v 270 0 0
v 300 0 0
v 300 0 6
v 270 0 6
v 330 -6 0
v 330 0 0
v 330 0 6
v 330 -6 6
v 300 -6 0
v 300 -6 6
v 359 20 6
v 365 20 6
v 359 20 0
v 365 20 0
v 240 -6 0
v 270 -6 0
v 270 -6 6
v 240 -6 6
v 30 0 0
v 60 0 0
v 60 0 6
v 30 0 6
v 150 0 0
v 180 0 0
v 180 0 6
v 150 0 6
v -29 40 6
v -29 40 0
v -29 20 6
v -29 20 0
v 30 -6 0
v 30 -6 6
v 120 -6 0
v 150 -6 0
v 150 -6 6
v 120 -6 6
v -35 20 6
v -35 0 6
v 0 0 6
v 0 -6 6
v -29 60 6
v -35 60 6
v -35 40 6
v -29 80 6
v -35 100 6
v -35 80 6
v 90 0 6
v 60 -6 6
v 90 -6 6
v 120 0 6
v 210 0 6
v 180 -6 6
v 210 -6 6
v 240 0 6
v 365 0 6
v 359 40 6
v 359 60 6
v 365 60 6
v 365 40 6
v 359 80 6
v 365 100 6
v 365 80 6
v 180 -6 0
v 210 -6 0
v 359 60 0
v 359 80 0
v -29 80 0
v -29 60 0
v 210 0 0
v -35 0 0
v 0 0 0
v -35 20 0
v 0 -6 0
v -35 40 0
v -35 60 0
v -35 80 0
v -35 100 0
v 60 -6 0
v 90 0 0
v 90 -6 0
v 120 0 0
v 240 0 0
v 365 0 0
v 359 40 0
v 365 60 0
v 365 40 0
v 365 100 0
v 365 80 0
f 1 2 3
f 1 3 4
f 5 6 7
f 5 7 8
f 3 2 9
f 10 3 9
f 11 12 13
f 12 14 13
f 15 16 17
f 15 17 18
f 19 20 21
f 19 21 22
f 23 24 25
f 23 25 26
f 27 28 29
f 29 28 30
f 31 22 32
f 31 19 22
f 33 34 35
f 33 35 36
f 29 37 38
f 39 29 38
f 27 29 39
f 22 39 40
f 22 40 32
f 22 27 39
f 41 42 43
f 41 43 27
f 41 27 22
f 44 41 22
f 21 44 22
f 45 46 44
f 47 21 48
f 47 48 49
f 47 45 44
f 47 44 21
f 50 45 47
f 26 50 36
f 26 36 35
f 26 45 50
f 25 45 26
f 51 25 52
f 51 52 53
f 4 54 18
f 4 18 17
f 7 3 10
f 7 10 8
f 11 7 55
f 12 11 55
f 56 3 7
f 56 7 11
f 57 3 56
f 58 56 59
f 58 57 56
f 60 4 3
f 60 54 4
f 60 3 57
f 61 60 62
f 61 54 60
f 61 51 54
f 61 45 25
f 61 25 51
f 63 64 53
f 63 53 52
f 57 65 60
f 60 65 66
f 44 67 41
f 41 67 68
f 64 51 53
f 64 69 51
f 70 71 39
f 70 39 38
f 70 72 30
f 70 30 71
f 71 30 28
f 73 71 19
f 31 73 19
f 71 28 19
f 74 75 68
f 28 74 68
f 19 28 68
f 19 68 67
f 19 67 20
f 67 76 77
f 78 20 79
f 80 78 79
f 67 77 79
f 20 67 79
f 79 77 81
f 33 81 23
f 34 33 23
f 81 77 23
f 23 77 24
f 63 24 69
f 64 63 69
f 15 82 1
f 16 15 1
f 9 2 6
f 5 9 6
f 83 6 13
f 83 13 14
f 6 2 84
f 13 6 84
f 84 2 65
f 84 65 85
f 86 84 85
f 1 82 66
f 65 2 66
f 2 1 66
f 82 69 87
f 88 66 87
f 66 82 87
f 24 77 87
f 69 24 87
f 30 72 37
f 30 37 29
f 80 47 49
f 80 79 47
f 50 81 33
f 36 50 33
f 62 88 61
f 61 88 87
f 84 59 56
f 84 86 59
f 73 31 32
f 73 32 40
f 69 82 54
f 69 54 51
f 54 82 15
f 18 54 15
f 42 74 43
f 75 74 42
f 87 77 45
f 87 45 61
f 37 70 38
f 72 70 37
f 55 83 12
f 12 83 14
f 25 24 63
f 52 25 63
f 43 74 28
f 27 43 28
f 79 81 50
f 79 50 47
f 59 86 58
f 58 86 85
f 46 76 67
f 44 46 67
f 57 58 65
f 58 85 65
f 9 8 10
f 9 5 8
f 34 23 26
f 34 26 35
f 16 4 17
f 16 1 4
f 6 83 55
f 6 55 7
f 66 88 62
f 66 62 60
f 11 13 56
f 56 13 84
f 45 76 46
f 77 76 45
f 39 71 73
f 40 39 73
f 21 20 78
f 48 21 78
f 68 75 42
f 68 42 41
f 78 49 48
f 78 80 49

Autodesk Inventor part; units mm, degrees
ref_plane "YZ Plane" through (0, 0, 0) normal (1, 0, 0) x (0, 1, 0)
ref_plane "XZ Plane" through (0, 0, 0) normal (0, 1, 0) x (-1, 0, 0)
ref_plane "XY Plane" through (0, 0, 0) normal (0, 0, 1) x (1, 0, 0)
ref_plane "Work Plane1" through (0, 0, 0) normal (0, 0, 1) x (1, 0, 0)
sketch "Sketch1" plane through (0, 0, 0) normal (0, 0, 1) x (1, 0, 0)
  line L0 (0, 0) -> (30, 0)
  line L1 (0, 0) -> (0, -6)
  line L2 (30, -6) -> (0, -6)
  line L3 (30, 0) -> (30, -6)
  line L4 (60, 0) -> (90, 0)
  line L5 (60, 0) -> (60, -6)
  line L6 (90, -6) -> (60, -6)
  line L7 (90, 0) -> (90, -6)
  line L8 (120, 0) -> (150, 0)
  line L9 (120, 0) -> (120, -6)
  line L10 (150, -6) -> (120, -6)
  line L11 (150, 0) -> (150, -6)
  line L12 (180, 0) -> (210, 0)
  line L13 (180, 0) -> (180, -6)
  line L14 (210, -6) -> (180, -6)
  line L15 (210, 0) -> (210, -6)
  line L16 (240, 0) -> (270, 0)
  line L17 (240, 0) -> (240, -6)
  line L18 (270, -6) -> (240, -6)
  line L19 (270, 0) -> (270, -6)
  line L20 (300, 0) -> (330, 0)
  line L21 (300, 0) -> (300, -6)
  line L22 (330, -6) -> (300, -6)
  line L23 (330, 0) -> (330, -6)
  line L24 (330, 0) -> (330, -6)
  line L25 (330, -6) -> (365, -6)
  line L26 (365, -6) -> (365, 0)
  line L27 (365, 0) -> (330, 0)
  line L28 (300, -6) -> (300, 0)
  line L29 (300, 0) -> (270, 0)
  line L30 (270, 0) -> (270, -6)
  line L31 (270, -6) -> (300, -6)
  line L32 (210, 0) -> (210, -6)
  line L33 (210, -6) -> (240, -6)
  line L34 (240, -6) -> (240, 0)
  line L35 (240, 0) -> (210, 0)
  line L36 (150, 0) -> (150, -6)
  line L37 (150, -6) -> (180, -6)
  line L38 (180, -6) -> (180, 0)
  line L39 (180, 0) -> (150, 0)
  line L40 (120, -6) -> (120, 0)
  line L41 (120, 0) -> (90, 0)
  line L42 (90, 0) -> (90, -6)
  line L43 (90, -6) -> (120, -6)
  line L44 (30, 0) -> (30, -6)
  line L45 (30, -6) -> (60, -6)
  line L46 (60, -6) -> (60, 0)
  line L47 (60, 0) -> (30, 0)
  line L48 (0, -6) -> (0, 0)
  line L49 (0, 0) -> (-35, 0)
  line L50 (-35, -6) -> (-35, 0)
  line L51 (-35, -6) -> (0, -6)
  line L52 (0, 0) -> (-35, 0)
  line L53 (30, 0) -> (60, 0)
  line L54 (90, 0) -> (120, 0)
  line L55 (150, 0) -> (180, 0)
  line L56 (210, 0) -> (240, 0)
  line L57 (270, 0) -> (300, 0)
  line L58 (330, 0) -> (365, 0)
  line L59 (330, 0) -> (330, -6)
  line L60 (300, 0) -> (300, -6)
  line L61 (330, -6) -> (300, -6)
  line L62 (270, 0) -> (270, -6)
  line L63 (240, -6) -> (240, 0)
  line L64 (240, -6) -> (270, -6)
  line L65 (210, 0) -> (210, -6)
  line L66 (180, -6) -> (210, -6)
  line L67 (180, -6) -> (180, 0)
  line L68 (150, 0) -> (150, -6)
  line L69 (120, -6) -> (150, -6)
  line L70 (120, -6) -> (120, 0)
  line L71 (90, 0) -> (90, -6)
  line L72 (90, -6) -> (60, -6)
  line L73 (60, 0) -> (60, -6)
  line L74 (30, 0) -> (30, -6)
  line L75 (0, 0) -> (0, -6)
  line L76 (30, -6) -> (0, -6)
  line L77 (-35, 0) -> (-35, 100)
  line L78 (-35, 100) -> (365, 100)
  line L79 (365, 0) -> (365, 100)
  dimension "d0" = 100
extrude "Plate1" add sketch "Sketch1" along normal blind 6 contours L49 L77 L78 L79 L27 L20 L29 L16 L35 L12 L39 L8 L41 L4 L47 L0 | L0 L3 L2 L1 | L4 L7 L6 L5 | L8 L11 L10 L9 | L23 L22 L21 L20 | L12 L15 L14 L13 | L19 L18 L17 L16
sketch "Sketch2" plane through (0, 0, 0) normal (0, 0, -1) x (-1, 0, 0)
  line L0 (-359, 60) -> (-359, 80) projected
  line L1 (-365, 80) -> (-359, 80) projected
  line L2 (-365, 80) -> (-365, 60) projected
  line L3 (-365, 60) -> (-359, 60) projected
  line L4 (-359, 20) -> (-359, 40) projected
  line L5 (-365, 40) -> (-359, 40) projected
  line L6 (-365, 40) -> (-365, 20) projected
  line L7 (-365, 20) -> (-359, 20) projected
  line L8 (29, 80) -> (29, 60) projected
  line L9 (35, 60) -> (29, 60) projected
  line L10 (35, 60) -> (35, 80) projected
  line L11 (35, 80) -> (29, 80) projected
  line L12 (29, 40) -> (29, 20) projected
  line L13 (35, 20) -> (29, 20) projected
  line L14 (35, 20) -> (35, 40) projected
  line L15 (35, 40) -> (29, 40) projected
  point P0 (0, 0)
extrude "Cut1" cut sketch "Sketch2" against normal blind 6
equation "\"d2\" = Thickness"
equation "\"d1\" = Thickness"
equation "\"BendRadius\" = Thickness"
equation "\"BendReliefWidth\" = Thickness"
equation "\"BendReliefDepth\" = 0.5 * Thickness"
equation "\"CornerReliefSize\" = 4 * Thickness"
equation "\"MinimumRemnant\" = 2 * Thickness"
equation "\"TransitionRadius\" = BendRadius"
equation "\"JacobiRadiusSize\" = BendRadius"
equation "\"GapSize\" = Thickness"
equation "\"Thickness\" = 6"
properties part number "zijkant electronica" material "Wood (Birch)"
